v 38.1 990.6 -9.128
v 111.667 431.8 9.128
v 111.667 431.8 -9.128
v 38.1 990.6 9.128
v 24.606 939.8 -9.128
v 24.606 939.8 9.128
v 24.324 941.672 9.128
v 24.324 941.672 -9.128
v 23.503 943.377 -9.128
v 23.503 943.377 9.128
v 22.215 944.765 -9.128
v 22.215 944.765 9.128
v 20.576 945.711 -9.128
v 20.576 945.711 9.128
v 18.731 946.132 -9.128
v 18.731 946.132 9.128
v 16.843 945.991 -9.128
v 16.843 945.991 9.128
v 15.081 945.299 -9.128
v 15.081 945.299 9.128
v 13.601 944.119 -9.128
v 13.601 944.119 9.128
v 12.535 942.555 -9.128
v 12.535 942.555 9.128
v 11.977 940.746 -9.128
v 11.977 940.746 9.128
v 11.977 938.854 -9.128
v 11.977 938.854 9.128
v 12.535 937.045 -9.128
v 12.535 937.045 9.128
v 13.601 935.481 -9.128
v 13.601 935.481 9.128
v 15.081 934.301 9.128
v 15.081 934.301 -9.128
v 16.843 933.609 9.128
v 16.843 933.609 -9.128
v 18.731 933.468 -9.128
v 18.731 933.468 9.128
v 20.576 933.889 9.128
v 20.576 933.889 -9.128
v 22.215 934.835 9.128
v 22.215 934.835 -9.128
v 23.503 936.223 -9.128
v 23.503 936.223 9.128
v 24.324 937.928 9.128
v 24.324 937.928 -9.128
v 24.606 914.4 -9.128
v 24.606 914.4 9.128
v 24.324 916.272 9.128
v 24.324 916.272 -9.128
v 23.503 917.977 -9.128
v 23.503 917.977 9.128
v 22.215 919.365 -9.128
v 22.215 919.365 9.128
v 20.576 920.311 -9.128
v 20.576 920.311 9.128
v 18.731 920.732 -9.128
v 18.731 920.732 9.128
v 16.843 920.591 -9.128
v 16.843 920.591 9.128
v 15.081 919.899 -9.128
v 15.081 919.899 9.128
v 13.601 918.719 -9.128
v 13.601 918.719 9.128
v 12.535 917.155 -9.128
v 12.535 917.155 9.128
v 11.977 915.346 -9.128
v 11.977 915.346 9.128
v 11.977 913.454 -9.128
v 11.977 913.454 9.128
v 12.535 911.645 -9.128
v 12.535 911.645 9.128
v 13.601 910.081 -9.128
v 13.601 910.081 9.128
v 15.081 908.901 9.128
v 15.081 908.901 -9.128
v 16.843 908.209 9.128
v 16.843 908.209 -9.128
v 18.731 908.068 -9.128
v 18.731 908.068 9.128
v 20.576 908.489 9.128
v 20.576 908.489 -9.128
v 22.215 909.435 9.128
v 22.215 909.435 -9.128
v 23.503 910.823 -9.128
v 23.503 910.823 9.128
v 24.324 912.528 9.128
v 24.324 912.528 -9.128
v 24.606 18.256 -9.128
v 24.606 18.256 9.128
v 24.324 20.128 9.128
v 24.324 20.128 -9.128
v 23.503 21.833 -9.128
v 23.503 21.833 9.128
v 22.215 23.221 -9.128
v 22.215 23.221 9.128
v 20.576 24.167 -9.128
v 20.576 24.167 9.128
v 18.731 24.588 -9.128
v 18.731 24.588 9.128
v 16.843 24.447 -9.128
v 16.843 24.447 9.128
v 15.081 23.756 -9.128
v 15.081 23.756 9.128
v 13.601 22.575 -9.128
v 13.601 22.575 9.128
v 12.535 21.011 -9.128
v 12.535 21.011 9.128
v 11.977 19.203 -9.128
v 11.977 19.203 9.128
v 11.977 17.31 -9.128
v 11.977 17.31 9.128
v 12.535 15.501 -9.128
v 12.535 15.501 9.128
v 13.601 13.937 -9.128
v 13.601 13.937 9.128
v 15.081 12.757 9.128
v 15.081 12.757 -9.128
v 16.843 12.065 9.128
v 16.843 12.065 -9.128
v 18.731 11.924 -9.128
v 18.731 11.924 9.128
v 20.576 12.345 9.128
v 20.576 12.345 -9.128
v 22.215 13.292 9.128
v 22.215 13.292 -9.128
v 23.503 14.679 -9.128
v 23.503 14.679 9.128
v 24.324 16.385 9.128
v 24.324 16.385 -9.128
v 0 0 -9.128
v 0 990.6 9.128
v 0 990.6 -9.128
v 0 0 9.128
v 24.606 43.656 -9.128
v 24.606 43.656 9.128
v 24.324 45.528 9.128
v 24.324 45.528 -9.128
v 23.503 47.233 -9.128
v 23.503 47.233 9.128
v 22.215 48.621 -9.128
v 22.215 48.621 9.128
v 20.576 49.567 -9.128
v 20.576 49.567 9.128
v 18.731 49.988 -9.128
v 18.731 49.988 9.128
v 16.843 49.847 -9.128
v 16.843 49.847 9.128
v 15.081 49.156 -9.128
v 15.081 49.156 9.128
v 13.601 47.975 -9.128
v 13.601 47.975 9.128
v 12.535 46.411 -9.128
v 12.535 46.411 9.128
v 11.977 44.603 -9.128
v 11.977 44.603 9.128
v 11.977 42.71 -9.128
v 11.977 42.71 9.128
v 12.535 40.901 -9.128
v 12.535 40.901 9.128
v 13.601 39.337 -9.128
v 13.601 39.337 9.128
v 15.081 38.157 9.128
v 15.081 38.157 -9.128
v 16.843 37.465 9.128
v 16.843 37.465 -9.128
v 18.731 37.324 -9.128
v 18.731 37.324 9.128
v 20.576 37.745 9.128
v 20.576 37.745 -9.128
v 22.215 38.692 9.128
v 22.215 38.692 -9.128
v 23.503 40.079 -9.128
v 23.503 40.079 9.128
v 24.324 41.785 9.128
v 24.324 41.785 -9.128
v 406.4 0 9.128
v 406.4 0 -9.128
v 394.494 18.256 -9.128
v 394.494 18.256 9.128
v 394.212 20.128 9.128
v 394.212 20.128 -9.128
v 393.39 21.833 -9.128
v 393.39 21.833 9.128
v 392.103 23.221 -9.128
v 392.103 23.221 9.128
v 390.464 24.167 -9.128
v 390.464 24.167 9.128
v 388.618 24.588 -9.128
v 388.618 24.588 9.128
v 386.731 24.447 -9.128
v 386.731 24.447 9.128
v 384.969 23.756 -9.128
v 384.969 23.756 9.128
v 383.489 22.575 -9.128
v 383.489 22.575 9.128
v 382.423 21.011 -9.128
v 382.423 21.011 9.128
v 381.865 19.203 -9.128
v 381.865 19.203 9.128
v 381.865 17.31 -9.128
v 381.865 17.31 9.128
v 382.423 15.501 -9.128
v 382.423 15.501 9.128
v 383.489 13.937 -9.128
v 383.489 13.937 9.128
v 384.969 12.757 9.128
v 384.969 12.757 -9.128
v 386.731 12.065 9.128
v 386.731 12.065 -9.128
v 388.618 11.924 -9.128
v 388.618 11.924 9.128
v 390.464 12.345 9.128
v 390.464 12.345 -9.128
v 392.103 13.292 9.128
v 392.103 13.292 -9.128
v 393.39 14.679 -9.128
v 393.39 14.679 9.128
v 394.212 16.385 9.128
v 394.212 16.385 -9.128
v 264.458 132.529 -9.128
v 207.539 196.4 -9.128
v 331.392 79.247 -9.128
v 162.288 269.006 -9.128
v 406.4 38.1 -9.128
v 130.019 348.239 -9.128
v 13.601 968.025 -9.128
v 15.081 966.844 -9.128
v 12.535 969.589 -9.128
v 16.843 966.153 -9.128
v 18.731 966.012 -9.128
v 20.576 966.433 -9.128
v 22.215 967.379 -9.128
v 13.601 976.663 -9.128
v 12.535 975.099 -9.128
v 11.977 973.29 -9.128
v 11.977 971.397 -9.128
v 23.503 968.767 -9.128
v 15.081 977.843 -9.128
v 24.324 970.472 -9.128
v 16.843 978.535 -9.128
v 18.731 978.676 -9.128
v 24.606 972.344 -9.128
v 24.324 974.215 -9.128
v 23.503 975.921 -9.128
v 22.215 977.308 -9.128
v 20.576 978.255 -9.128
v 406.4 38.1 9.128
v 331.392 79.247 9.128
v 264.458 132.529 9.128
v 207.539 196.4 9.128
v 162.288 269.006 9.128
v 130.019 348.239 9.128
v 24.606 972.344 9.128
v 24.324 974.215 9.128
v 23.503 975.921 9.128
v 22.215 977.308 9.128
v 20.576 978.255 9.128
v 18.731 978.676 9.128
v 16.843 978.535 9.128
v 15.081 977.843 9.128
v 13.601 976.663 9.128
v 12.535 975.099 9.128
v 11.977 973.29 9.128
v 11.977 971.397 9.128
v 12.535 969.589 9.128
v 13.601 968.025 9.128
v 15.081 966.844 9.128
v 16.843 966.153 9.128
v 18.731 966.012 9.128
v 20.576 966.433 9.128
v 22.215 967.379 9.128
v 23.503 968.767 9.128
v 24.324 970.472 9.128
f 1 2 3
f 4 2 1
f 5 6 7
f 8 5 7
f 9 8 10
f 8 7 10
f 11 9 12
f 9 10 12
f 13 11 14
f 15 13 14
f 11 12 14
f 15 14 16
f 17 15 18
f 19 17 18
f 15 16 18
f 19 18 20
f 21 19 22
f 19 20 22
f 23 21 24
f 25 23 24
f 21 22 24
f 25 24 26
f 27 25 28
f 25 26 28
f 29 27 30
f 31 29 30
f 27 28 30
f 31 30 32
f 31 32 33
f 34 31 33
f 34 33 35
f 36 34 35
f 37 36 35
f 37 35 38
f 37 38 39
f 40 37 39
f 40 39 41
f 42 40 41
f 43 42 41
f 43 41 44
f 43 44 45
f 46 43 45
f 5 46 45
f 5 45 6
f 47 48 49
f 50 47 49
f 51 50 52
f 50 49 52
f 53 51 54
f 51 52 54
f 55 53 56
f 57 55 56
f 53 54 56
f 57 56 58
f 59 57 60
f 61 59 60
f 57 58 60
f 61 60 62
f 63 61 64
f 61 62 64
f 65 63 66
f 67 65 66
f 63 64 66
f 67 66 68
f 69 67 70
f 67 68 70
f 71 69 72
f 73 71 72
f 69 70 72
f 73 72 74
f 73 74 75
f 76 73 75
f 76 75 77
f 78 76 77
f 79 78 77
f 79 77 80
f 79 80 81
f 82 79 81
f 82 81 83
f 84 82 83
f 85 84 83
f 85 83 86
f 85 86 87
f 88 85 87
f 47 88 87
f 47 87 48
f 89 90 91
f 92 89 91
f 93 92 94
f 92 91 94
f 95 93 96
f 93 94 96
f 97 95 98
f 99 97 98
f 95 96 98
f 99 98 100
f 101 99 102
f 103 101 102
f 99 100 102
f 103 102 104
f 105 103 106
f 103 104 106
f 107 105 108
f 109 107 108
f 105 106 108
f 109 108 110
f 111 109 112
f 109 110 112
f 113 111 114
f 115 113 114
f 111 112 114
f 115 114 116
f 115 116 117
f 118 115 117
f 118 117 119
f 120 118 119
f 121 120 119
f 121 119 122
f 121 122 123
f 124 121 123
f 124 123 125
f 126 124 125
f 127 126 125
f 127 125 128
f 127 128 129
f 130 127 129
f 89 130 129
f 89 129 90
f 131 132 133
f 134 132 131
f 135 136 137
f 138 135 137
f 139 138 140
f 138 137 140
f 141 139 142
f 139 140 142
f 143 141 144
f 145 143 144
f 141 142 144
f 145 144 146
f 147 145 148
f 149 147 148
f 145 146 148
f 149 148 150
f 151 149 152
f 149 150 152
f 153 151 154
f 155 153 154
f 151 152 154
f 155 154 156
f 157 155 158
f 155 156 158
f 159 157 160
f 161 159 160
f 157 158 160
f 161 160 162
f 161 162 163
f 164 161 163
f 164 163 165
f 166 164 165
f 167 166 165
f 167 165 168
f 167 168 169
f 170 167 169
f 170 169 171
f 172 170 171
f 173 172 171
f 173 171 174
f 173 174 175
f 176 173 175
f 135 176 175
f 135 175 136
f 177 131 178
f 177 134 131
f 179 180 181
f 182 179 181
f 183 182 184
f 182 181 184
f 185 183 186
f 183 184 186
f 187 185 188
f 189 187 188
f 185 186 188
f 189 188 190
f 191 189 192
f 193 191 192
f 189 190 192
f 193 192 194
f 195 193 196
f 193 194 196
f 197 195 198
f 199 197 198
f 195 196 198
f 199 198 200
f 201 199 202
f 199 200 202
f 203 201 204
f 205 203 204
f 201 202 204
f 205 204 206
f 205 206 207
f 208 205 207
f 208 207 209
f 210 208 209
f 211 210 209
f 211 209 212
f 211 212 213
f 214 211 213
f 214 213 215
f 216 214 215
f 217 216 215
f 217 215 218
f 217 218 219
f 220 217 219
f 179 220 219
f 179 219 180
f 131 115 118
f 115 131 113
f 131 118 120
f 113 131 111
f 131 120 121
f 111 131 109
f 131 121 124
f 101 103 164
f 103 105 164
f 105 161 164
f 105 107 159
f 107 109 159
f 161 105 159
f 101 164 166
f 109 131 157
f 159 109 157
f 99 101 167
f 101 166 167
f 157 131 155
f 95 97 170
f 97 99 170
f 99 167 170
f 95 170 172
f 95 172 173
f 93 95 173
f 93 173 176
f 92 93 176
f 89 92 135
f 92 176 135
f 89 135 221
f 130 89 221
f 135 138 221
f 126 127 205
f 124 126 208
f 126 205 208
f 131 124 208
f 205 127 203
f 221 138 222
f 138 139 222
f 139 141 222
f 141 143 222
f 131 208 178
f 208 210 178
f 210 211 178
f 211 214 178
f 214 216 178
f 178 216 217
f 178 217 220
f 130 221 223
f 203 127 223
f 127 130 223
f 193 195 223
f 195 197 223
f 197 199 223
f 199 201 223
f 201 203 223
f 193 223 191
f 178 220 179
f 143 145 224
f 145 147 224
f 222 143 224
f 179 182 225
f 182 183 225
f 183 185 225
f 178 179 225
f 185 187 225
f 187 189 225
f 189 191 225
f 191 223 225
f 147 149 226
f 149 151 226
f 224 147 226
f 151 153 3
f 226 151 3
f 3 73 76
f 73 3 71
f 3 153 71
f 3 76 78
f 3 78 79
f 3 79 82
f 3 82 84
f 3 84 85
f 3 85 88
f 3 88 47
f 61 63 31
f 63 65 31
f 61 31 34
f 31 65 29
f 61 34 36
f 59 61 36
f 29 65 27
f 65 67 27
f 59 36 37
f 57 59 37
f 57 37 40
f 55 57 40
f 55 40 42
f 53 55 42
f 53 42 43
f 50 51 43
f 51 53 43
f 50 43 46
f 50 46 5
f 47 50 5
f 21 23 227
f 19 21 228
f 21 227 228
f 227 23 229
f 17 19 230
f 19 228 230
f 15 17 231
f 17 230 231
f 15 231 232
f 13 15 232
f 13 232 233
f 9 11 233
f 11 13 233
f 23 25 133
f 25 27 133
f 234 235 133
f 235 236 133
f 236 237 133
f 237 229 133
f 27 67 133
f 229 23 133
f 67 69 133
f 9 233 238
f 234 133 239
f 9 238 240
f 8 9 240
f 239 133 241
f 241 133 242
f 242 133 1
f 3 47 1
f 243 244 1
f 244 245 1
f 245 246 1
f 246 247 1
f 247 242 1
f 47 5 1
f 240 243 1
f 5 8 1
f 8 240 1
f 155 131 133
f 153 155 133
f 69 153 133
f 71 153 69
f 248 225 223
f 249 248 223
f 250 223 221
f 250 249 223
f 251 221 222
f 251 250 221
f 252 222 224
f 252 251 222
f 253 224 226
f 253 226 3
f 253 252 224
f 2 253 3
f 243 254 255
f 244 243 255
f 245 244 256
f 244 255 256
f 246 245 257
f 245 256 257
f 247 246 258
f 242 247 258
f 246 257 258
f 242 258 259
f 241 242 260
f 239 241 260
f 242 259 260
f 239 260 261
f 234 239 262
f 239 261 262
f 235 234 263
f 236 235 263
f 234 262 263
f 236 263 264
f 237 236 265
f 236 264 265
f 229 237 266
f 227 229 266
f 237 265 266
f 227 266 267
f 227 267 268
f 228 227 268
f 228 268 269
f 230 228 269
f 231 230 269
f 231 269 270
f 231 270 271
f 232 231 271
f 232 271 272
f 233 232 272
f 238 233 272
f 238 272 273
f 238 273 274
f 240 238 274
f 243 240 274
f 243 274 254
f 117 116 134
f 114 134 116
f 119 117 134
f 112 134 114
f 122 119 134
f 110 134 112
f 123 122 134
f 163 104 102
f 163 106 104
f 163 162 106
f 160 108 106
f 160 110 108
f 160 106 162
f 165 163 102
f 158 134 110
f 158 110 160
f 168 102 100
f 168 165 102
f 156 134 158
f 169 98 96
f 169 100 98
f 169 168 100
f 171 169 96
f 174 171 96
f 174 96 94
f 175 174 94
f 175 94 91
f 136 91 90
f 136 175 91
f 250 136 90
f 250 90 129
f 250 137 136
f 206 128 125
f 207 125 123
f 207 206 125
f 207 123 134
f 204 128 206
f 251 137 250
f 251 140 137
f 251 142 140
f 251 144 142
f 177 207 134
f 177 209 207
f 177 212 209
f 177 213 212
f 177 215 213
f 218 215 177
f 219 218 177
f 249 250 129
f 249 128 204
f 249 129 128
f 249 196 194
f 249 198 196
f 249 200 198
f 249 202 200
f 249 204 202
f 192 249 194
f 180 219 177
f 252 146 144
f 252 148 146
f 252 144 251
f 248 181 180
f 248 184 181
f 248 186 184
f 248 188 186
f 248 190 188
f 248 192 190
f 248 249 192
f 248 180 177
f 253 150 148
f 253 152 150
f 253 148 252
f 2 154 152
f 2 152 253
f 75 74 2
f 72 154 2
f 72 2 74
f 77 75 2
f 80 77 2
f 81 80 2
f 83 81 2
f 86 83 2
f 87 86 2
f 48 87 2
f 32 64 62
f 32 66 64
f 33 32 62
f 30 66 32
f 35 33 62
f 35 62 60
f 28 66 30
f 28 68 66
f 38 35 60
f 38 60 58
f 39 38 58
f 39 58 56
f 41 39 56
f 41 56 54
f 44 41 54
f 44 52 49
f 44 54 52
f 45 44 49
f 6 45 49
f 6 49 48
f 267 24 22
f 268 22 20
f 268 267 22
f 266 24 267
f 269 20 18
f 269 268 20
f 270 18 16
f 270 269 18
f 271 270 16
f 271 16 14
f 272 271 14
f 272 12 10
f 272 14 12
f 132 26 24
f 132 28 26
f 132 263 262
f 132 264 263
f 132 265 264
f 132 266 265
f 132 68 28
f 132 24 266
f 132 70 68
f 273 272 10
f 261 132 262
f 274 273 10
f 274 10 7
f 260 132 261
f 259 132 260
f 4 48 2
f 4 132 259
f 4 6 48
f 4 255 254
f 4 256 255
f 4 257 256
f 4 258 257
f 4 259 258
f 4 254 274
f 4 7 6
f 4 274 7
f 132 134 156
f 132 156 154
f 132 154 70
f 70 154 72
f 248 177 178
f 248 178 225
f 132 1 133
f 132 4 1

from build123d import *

# Parameters (mm, degrees)
BOSS_EXTRUDE1_DEPTH = 9.128125
SKETCH2_R           = 6.35
CUT_EXTRUDE1_DEPTH  = 1071.879363264


with BuildPart() as part:
    # Sketch1 → Boss-Extrude1 (new, symmetric)
    with BuildSketch(Plane.XY):
        with BuildLine():
            Line((0, 0), (406.4, 0))
            Line((406.4, 0), (406.4, 38.1))
            ThreePointArc((406.4, 38.1), (207.539140749, 196.40002074), (111.667415652, 431.8))
            Line((111.667415652, 431.8), (38.1, 990.6))
            Line((38.1, 990.6), (0, 990.6))
            Line((0, 990.6), (0, 0))
        make_face()
    extrude(amount=BOSS_EXTRUDE1_DEPTH, both=True)

    # Sketch2 → Cut-Extrude1 (cut, through all)
    with BuildSketch(Plane.XY.offset(9.128125)):
        with Locations((18.25625, 972.34375)):
            Circle(SKETCH2_R)
        with Locations((18.25625, 18.25625)):
            Circle(SKETCH2_R)
        with Locations((388.14375, 18.25625)):
            Circle(SKETCH2_R)
        with Locations((18.25625, 43.65625)):
            Circle(SKETCH2_R)
        with Locations((18.25625, 939.8)):
            Circle(SKETCH2_R)
        with Locations((18.25625, 914.4)):
            Circle(SKETCH2_R)
    extrude(amount=-CUT_EXTRUDE1_DEPTH, mode=Mode.SUBTRACT)


solid = part.part
